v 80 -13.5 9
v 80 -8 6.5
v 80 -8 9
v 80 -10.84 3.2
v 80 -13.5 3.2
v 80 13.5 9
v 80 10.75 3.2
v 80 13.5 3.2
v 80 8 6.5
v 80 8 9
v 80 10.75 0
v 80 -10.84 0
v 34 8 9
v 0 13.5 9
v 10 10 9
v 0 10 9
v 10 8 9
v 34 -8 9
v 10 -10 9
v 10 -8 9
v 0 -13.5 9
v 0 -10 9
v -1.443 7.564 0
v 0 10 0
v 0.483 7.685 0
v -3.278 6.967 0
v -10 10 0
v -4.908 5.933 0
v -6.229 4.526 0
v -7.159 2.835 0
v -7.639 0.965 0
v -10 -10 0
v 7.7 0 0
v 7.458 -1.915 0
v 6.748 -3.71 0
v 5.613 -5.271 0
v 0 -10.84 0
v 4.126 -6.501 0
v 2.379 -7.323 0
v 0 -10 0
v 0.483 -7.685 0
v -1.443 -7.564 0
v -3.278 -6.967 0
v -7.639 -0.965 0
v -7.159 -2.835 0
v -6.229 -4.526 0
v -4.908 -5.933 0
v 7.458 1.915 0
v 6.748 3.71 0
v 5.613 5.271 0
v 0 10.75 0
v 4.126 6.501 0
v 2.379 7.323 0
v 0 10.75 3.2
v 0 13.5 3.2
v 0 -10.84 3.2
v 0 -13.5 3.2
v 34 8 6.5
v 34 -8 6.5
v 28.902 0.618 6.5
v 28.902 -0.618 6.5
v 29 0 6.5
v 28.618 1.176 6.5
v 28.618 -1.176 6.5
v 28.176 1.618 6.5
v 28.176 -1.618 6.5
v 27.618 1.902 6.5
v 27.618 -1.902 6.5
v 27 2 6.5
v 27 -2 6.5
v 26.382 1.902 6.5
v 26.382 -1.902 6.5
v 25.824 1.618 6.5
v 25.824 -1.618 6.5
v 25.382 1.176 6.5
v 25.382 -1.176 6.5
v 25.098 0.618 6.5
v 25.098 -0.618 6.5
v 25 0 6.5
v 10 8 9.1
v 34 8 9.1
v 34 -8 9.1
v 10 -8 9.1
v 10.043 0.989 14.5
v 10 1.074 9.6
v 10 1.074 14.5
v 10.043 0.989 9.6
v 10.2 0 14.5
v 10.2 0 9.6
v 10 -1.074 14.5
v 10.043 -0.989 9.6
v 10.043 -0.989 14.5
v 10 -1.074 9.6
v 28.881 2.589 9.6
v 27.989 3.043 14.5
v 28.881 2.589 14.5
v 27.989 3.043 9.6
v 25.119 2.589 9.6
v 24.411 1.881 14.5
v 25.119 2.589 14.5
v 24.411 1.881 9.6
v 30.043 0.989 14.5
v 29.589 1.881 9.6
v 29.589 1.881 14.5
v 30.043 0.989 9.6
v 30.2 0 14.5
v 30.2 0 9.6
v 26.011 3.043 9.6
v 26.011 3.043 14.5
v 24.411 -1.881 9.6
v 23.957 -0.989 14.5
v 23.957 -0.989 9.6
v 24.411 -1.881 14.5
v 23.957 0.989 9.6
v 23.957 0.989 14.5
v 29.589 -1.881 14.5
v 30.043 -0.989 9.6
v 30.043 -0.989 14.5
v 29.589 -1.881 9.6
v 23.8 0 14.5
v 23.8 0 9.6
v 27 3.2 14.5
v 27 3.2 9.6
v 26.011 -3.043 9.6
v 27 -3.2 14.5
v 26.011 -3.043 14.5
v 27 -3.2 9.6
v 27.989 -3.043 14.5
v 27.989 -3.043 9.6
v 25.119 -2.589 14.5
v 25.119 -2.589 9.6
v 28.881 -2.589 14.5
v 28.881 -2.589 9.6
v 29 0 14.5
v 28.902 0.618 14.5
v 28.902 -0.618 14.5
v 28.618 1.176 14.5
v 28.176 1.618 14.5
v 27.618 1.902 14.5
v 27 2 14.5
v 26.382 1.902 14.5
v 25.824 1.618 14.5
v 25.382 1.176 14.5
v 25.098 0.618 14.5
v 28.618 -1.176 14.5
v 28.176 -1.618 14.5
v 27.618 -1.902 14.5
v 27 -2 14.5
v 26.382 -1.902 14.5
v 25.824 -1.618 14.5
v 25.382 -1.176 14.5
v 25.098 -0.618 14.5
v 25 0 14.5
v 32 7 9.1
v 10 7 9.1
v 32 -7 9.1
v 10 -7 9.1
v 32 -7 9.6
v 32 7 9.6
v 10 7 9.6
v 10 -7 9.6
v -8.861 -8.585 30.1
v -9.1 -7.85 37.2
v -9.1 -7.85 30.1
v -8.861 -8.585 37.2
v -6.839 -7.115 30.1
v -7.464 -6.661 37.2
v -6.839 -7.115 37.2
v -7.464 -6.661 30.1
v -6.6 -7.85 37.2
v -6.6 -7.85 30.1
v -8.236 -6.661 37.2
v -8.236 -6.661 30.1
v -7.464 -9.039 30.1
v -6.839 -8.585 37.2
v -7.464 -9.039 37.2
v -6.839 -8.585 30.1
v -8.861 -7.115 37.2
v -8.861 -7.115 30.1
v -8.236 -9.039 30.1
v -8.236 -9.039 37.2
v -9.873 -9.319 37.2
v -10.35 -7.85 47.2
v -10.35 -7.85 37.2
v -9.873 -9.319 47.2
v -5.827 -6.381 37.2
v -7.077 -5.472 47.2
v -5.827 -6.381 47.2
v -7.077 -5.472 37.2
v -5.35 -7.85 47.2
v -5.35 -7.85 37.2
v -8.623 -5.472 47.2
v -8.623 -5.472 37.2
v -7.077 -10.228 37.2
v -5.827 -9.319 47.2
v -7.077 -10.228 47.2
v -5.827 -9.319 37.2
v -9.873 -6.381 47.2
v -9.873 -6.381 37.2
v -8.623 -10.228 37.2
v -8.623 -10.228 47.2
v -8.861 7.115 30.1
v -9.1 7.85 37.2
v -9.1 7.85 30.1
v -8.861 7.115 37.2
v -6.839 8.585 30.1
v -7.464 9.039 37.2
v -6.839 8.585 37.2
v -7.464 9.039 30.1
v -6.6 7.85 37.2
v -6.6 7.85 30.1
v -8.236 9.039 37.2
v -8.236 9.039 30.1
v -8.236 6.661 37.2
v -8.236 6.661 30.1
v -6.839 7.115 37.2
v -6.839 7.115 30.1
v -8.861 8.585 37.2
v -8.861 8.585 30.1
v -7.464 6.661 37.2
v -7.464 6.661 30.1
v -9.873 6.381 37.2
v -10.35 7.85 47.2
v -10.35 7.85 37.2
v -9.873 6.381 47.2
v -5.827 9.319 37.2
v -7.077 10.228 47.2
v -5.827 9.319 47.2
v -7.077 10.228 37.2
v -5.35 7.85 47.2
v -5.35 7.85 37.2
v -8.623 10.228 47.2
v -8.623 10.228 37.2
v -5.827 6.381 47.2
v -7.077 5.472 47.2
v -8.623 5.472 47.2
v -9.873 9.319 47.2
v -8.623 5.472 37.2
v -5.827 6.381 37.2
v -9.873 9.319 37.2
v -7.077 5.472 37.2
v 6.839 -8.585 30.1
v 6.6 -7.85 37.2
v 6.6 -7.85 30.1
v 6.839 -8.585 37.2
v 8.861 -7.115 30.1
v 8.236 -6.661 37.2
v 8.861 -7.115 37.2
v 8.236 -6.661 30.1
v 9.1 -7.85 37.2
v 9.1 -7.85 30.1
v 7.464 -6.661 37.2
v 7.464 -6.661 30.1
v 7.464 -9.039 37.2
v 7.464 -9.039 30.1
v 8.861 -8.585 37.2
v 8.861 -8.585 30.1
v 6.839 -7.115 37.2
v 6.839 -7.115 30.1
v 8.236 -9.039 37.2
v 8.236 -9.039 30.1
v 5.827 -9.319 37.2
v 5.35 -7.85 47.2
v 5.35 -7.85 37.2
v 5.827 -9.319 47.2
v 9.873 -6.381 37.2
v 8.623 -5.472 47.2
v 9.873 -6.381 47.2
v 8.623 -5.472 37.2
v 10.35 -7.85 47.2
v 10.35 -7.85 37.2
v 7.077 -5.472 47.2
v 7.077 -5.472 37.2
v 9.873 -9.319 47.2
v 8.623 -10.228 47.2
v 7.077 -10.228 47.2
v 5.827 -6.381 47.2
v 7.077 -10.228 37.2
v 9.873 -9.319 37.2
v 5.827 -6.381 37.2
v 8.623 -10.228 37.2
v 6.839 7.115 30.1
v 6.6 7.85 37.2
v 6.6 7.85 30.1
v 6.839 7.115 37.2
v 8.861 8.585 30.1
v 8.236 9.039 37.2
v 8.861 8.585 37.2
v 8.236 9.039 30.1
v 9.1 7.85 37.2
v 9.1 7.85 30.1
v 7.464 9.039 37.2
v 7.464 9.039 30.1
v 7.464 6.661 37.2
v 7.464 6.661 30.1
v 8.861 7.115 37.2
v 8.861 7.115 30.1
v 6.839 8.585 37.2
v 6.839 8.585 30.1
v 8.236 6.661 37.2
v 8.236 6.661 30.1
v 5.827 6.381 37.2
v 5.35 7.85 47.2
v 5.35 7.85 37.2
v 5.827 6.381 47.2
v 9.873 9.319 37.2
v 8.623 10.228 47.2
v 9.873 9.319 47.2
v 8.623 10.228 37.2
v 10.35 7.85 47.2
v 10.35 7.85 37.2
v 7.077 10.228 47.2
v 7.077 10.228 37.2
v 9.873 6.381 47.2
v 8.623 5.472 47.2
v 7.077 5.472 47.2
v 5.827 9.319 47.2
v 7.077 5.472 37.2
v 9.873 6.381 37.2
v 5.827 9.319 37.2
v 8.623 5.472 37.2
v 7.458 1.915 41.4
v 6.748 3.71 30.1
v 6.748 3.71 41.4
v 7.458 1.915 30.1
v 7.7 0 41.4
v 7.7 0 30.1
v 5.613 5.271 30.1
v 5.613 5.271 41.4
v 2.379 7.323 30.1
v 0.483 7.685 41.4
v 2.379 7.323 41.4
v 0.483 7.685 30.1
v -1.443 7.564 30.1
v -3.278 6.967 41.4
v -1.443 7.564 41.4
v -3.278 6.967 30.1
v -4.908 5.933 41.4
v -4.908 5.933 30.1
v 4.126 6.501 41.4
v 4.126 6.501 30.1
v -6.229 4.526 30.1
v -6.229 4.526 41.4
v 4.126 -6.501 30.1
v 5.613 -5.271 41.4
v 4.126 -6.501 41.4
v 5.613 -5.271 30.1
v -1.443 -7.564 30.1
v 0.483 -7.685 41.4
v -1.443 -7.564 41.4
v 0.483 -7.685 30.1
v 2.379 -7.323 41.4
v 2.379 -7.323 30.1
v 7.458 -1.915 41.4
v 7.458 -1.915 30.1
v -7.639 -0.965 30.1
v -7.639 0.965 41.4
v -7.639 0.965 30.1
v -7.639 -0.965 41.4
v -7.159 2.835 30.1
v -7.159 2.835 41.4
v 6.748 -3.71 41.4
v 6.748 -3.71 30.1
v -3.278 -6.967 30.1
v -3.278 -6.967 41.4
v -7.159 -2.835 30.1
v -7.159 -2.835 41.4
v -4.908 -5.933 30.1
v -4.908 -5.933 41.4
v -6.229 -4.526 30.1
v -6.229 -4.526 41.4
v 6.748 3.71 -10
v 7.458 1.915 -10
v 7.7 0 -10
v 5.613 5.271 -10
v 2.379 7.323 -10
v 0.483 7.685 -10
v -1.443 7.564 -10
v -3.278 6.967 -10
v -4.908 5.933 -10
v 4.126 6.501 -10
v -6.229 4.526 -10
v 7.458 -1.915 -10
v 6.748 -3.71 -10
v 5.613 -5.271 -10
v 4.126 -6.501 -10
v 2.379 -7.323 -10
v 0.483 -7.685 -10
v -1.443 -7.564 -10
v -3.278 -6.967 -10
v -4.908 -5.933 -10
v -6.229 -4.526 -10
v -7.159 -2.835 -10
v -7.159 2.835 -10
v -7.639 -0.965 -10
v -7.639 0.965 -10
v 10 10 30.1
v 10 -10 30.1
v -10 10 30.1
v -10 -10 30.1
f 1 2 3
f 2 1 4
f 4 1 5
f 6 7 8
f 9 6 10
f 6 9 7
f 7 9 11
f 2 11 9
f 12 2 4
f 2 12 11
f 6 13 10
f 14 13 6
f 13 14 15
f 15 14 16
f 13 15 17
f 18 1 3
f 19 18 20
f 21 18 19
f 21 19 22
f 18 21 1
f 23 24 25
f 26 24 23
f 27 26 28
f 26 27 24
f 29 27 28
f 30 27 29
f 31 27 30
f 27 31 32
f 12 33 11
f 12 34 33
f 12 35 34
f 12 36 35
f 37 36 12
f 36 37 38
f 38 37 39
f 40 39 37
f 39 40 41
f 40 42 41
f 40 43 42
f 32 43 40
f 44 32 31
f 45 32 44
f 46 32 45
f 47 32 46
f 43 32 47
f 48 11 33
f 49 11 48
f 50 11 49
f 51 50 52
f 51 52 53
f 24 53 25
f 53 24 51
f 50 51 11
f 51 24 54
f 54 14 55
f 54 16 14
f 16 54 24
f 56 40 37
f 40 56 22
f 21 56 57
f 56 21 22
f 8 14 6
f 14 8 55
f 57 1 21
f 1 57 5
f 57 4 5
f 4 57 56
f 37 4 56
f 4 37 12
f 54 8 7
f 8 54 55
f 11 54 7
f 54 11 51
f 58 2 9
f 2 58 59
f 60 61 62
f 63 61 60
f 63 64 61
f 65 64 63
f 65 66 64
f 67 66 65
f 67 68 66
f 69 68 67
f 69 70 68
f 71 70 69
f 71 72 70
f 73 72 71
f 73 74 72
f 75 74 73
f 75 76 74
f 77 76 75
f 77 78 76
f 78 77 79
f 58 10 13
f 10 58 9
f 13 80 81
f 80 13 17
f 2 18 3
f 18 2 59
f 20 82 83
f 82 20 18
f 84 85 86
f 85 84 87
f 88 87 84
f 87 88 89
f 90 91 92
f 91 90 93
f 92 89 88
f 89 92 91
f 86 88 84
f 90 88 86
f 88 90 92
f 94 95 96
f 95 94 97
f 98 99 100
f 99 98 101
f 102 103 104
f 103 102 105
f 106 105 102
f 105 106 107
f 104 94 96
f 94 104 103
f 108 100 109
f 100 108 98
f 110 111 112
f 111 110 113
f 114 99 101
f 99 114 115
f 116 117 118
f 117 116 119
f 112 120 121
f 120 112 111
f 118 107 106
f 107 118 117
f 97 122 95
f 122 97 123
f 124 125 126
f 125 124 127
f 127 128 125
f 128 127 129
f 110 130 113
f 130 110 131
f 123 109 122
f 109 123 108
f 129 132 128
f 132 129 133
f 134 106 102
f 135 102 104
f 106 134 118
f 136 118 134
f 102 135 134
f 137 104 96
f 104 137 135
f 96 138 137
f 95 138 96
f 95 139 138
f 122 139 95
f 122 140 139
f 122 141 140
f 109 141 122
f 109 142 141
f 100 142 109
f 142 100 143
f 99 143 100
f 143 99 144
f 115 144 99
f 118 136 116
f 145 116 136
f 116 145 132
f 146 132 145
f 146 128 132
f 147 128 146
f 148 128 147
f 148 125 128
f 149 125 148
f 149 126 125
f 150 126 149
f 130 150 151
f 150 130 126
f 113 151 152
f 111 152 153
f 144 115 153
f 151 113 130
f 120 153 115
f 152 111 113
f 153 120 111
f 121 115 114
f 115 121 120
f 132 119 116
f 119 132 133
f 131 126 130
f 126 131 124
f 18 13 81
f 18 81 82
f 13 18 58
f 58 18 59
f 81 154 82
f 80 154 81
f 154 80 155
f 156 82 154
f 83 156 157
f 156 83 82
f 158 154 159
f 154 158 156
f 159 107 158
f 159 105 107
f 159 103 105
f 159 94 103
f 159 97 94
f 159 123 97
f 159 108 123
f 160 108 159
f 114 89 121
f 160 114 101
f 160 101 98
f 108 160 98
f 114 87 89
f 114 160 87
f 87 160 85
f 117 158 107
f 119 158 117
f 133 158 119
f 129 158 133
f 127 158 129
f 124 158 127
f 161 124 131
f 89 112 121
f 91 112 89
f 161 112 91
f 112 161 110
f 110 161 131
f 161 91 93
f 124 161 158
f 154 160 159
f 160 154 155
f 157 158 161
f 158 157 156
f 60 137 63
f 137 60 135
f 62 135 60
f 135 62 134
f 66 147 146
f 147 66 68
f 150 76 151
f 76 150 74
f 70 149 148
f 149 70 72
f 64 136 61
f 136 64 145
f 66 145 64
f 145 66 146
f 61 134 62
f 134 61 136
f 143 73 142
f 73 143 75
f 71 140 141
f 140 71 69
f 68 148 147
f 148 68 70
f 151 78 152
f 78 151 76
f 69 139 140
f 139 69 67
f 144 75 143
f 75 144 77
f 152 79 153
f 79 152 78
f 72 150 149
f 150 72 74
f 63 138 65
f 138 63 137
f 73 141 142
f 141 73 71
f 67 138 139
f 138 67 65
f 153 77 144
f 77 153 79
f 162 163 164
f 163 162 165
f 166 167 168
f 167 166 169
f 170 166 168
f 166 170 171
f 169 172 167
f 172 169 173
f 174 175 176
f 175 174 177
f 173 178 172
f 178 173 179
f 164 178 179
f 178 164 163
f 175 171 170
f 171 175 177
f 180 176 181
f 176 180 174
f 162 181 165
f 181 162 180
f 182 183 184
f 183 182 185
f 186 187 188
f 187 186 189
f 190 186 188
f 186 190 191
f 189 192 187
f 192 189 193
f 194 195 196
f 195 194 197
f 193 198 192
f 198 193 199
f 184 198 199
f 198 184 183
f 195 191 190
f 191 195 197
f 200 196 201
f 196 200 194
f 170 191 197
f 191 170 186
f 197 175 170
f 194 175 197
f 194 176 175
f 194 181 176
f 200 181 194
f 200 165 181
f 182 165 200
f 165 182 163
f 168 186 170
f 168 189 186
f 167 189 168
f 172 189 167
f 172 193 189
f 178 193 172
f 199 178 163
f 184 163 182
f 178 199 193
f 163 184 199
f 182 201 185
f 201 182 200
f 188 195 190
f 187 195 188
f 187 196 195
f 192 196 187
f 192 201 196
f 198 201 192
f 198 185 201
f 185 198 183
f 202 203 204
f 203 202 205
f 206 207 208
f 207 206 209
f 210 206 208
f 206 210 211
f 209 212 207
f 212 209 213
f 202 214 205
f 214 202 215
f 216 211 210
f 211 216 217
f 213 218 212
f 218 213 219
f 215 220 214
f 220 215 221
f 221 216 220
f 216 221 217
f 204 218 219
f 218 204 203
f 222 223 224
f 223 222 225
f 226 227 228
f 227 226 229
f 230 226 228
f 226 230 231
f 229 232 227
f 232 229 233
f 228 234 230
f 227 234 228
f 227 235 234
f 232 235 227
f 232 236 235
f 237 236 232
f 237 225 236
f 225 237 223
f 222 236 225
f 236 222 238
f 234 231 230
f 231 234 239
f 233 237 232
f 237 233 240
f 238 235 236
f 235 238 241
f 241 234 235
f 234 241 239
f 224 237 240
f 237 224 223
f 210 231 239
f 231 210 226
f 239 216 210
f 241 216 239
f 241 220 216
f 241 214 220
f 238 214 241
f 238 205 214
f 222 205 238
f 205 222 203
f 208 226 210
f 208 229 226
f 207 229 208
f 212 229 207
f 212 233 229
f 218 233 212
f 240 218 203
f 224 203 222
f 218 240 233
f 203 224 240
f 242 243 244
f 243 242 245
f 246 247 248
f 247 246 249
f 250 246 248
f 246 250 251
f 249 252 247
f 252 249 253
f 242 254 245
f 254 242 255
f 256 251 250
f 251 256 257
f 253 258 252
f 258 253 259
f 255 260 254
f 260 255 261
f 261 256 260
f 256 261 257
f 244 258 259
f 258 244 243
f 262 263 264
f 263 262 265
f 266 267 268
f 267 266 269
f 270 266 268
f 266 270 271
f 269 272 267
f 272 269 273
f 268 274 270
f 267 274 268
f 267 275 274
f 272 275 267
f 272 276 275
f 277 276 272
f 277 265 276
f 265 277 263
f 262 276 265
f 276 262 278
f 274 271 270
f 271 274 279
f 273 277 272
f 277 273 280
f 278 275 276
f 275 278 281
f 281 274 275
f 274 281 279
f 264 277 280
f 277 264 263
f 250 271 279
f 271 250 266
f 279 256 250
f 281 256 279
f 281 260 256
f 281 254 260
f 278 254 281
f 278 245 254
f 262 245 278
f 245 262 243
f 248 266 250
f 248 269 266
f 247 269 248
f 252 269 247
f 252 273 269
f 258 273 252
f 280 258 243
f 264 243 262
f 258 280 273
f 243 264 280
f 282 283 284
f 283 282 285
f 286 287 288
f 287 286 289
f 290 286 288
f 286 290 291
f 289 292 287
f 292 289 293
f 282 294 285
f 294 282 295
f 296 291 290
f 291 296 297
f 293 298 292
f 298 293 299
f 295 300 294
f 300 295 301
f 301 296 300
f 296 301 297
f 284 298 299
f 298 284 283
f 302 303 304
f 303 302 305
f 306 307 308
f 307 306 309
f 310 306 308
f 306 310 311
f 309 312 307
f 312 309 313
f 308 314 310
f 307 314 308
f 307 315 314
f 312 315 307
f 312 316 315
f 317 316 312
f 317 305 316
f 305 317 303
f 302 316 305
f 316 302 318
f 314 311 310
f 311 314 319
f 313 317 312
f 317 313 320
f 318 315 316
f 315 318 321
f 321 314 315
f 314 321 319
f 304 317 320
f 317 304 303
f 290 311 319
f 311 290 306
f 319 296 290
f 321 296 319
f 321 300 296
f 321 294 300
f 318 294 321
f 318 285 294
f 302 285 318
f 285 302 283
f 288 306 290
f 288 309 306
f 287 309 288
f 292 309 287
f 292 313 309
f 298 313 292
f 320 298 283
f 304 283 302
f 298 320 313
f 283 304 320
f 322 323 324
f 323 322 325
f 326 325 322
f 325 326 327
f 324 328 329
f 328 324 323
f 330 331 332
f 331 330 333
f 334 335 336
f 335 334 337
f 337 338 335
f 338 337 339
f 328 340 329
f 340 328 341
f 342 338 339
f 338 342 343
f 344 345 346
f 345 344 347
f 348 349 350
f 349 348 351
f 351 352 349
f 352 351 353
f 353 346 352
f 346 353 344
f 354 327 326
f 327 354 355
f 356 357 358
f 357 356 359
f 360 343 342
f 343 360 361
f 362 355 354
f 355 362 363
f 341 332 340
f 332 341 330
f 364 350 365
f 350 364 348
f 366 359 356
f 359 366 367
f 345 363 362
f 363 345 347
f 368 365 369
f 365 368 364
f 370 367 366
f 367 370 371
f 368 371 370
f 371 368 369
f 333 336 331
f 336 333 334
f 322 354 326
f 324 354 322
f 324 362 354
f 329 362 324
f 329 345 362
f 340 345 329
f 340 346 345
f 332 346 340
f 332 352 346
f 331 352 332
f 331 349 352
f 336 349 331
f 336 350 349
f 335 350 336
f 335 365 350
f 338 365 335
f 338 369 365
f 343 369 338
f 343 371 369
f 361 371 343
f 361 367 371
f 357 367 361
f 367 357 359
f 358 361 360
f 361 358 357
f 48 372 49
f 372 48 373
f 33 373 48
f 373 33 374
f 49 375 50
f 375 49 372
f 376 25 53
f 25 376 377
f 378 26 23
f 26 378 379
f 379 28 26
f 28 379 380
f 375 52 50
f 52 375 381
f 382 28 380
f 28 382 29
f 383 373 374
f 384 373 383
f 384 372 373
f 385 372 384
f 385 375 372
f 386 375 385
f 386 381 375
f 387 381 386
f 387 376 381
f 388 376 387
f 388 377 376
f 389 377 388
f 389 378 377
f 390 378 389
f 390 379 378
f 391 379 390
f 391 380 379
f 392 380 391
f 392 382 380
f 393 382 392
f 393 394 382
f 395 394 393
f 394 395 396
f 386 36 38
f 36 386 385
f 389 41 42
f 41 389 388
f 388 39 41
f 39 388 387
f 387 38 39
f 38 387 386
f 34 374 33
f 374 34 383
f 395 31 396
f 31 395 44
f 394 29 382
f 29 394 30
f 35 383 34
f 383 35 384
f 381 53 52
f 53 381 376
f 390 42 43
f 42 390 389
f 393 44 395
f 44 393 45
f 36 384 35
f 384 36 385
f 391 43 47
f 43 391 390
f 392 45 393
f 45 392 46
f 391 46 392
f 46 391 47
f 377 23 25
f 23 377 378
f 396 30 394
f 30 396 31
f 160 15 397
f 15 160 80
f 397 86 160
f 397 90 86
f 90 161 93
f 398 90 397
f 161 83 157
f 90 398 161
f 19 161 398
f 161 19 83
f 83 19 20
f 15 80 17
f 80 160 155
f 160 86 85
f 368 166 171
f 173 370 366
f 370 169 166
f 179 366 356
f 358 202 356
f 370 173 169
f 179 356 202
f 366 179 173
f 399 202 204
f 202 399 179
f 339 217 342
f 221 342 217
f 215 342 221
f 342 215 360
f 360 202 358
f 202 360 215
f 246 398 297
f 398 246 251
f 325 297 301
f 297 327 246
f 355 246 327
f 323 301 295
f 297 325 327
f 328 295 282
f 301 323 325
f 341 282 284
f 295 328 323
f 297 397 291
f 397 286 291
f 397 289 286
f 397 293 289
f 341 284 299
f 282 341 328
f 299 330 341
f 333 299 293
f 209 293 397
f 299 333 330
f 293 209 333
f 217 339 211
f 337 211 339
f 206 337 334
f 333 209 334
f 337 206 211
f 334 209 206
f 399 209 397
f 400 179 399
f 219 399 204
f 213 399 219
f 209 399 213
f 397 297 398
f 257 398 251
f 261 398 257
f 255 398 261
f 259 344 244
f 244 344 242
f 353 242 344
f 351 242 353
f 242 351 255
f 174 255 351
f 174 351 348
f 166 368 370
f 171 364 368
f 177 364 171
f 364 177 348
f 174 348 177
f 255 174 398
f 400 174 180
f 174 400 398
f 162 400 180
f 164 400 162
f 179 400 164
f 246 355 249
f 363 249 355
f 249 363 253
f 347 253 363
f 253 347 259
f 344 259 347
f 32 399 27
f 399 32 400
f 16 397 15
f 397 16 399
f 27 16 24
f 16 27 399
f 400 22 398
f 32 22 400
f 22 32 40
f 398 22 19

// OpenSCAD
module Islot5(l=100){
translate([l/2,0,0]){cube([l,5,6.6],center=true);
translate([0,0,1])hull(){
cube([l,5,4.5],center=true);
translate([0,0,-1.5])cube([l,11,1.5],center=true);
}
}
}

module rcorner(r,l){
translate([l/2,0,0])difference(){
cube([l,r*2,r*2],center=true);
for(i=[-1,1])for(j=[-1,1])translate([0,i*r,j*r])rotate([0,90,0])cylinder(r=r,h=l+1,$fn=20,center=true);
}
}


module profilex020(l=100,x=4){
xwidth=x*10;
color("beige")difference(){
translate([0,-xwidth,-10])cube([l,2*xwidth,20]);
if(x>1)for(i=[1:x-1])translate([-.5,-xwidth+i*20,0])rotate([0,90,0])cylinder(r=12.5/2,$fn=20,h=l+1);

for(i=[0:x-1])translate([-.5,-xwidth+10+i*20,0]){
rotate([0,90,0])cylinder(r=4.3/2,$fn=20,h=l+1);
translate([0,0,-6.9])Islot5(l+1);
mirror([0,0,1])translate([0,0,-6.9])Islot5(l+1);
}
for(i=[0,1])mirror([0,i,0])translate([-.5,-xwidth+3.1,0])rotate([-90,0,0])Islot5(l+1);
for(i=[-xwidth,xwidth])for(j=[-10,10])translate([-.5,i,j])rcorner(2,l+1);
}
}

module profile8020(l=100){
echo(str("profile 8020 L:",l,"mm weight:",(l*.00189),"kg"));
profilex020(l=l,x=4);
}
module profile4020(l=100){
echo(str("profile 4020 L:",l,"mm weight:",(l*.00089),"kg"));
profilex020(l=l,x=2);
}
module profile6020(l=100){
echo(str("profile 6020 L:",l,"mm weight:",(l*.00128),"kg"));
profilex020(l=l,x=3);
}
module profile2020(l=100){
echo(str("profile 2020 L:",l,"mm weight:",(l*.00049),"kg"));
profilex020(l=l,x=1);
}


module drylinn80(len=100,pos=0){
echo(str("drylin NS-01-80 L:",len,"mm weight:",(len*.00114+0.1),"kg"));
xpos=max(0,min(pos,len-80));
color("gray")difference(){
translate([0,-40,0])cube([len,80,12]);
for(i=[0:round(len/150)]){
translate([25+150*i,0,-1]){
	translate([0,20,0])cylinder(r=2,$fn=20,h=30);
	translate([0,-20,0])cylinder(r=2,$fn=20,h=30);
	translate([0,20,4.5])cylinder(r=4,$fn=20,h=30);
	translate([0,-20,4.5])cylinder(r=4,$fn=20,h=30);
	
}
}
translate([-.5,-57/2,6.5])cube([len+1,57,6]);
}
color("beige")difference(){union(){
translate([xpos,-56/2,6.1])cube([80,56,3]);
translate([xpos+6,-56/2,5.9])cube([68,56,6.1]);
}for(i=[0,56])for(j=[-22.5,22.5])translate([xpos+12+i,j,0])cylinder(r=2,$fn=20,h=15);
}

}


module drylinn27(len=80,pos=0){
//echo(str("drylin NS-01-80 L:",len,"mm weight:",(len*.00114+0.1),"kg"));
xpos=max(0,min(pos,len-20));
color("gray")difference(){
translate([0,-27/2,0])cube([len,27,9]);
translate([-.5,-27/2-.1,-.1])cube([len+1,2.76,3.3]);
translate([-.5,27/2-2.75,-.1])cube([len+1,2.76,3.3]);
for(i=[0:round(len/150)]){
translate([25+150*i,0,-1]){
	translate([0,20,0])cylinder(r=2,$fn=20,h=30);
	translate([0,-20,0])cylinder(r=2,$fn=20,h=30);
	translate([0,20,4.5])cylinder(r=4,$fn=20,h=30);
	translate([0,-20,4.5])cylinder(r=4,$fn=20,h=30);
	
}
}
translate([-.5,-16/2,6.5])cube([len+1,16,6]);
}
color("beige")difference(){union(){
translate([xpos,-16/2,6.1])cube([34,16,3]);
translate([xpos+2,-16/2+1,6.6])cube([30,14,3]);
for(i=[0,20])translate([xpos+7	+i,0,9])cylinder(r=3.2,$fn=20,h=5.5);
}
for(i=[0,20])translate([xpos+7	+i,0,2])cylinder(r=2,$fn=20,h=15.5);
}
}


drylinn27(80);

module nema17(cutout=true){
difference(){union(){translate([0,0,-48/2])cube([42,42,48],true);
translate([0,0,-1])cylinder(r=11,h=3.5);

translate([0,0,-1])cylinder(r=2.5,h=25,$fn=30);
if(cutout==true){
translate([0,0,-1])cylinder(r=12.5,h=25);
for(i=[-31/2,31/2])for(j=[-31/2,31/2]){
translate([i,j,-1])cylinder(r=2,h=12,$fn=10);
translate([i,j,10])cylinder(r=4,h=31,$fn=10);
}
}
}
if(cutout!=true){for(i=[-31/2,31/2])for(j=[-31/2,31/2]){
translate([i,j,-4])cylinder(r=2,h=11,$fn=10);
}
}
}
}


module hsnema8(cutout=true){
difference(){
union(){
translate([0,0,30.1/2])cube([20,20,30.1],center=true);
translate([0,0,30.0])cylinder(r=7.5,h=1.4);
translate([0,0,-7])cylinder(r=2.5,h=7.1,$fn=30);
translate([0,0,30.0])cylinder(r=2.5,h=7.1,$fn=30);
if(cutout==true){
translate([0,0,30.0])cylinder(r=7.7,h=11.4);
translate([0,0,-10.0])cylinder(r=7.7,h=11.4);
for(i=[-15.7/2,15.7/2])for(j=[-15.7/2,15.7/2])translate([i,j,28.2+1]){
cylinder(r=2.5/2,h=10.1,$fn=10);
translate([0,0,8])cylinder(r=5/2,h=10,$fn=10);
}
}

}
for(i=[-15.7/2,15.7/2])for(j=[-15.7/2,15.7/2])translate([i,j,28.2])if(cutout!=true){
cylinder(r=2.5/2,h=2,$fn=10);
}
if(cutout!=true){
cylinder(r=2.5/2,h=80,center=true,$fn=20);
}
}
}

hsnema8();

module nema14(cutout=true){
difference(){union(){translate([0,0,-36/2])cube([35,35,36],true);
translate([0,0,-1])cylinder(r=11,h=3.5);

translate([0,0,-1])cylinder(r=2.5,h=25,$fn=30);
if(cutout==true){
translate([0,0,-1])cylinder(r=11.5,h=25);
for(i=[-26/2,26/2])for(j=[-26/2,26/2]){
translate([i,j,-1])cylinder(r=2,h=12,$fn=10);
translate([i,j,10])cylinder(r=4,h=31,$fn=10);
}
}
}
if(cutout!=true){for(i=[-26/2,26/2])for(j=[-26/2,26/2]){
translate([i,j,-4])cylinder(r=2,h=11,$fn=10);
}
}
}
}
